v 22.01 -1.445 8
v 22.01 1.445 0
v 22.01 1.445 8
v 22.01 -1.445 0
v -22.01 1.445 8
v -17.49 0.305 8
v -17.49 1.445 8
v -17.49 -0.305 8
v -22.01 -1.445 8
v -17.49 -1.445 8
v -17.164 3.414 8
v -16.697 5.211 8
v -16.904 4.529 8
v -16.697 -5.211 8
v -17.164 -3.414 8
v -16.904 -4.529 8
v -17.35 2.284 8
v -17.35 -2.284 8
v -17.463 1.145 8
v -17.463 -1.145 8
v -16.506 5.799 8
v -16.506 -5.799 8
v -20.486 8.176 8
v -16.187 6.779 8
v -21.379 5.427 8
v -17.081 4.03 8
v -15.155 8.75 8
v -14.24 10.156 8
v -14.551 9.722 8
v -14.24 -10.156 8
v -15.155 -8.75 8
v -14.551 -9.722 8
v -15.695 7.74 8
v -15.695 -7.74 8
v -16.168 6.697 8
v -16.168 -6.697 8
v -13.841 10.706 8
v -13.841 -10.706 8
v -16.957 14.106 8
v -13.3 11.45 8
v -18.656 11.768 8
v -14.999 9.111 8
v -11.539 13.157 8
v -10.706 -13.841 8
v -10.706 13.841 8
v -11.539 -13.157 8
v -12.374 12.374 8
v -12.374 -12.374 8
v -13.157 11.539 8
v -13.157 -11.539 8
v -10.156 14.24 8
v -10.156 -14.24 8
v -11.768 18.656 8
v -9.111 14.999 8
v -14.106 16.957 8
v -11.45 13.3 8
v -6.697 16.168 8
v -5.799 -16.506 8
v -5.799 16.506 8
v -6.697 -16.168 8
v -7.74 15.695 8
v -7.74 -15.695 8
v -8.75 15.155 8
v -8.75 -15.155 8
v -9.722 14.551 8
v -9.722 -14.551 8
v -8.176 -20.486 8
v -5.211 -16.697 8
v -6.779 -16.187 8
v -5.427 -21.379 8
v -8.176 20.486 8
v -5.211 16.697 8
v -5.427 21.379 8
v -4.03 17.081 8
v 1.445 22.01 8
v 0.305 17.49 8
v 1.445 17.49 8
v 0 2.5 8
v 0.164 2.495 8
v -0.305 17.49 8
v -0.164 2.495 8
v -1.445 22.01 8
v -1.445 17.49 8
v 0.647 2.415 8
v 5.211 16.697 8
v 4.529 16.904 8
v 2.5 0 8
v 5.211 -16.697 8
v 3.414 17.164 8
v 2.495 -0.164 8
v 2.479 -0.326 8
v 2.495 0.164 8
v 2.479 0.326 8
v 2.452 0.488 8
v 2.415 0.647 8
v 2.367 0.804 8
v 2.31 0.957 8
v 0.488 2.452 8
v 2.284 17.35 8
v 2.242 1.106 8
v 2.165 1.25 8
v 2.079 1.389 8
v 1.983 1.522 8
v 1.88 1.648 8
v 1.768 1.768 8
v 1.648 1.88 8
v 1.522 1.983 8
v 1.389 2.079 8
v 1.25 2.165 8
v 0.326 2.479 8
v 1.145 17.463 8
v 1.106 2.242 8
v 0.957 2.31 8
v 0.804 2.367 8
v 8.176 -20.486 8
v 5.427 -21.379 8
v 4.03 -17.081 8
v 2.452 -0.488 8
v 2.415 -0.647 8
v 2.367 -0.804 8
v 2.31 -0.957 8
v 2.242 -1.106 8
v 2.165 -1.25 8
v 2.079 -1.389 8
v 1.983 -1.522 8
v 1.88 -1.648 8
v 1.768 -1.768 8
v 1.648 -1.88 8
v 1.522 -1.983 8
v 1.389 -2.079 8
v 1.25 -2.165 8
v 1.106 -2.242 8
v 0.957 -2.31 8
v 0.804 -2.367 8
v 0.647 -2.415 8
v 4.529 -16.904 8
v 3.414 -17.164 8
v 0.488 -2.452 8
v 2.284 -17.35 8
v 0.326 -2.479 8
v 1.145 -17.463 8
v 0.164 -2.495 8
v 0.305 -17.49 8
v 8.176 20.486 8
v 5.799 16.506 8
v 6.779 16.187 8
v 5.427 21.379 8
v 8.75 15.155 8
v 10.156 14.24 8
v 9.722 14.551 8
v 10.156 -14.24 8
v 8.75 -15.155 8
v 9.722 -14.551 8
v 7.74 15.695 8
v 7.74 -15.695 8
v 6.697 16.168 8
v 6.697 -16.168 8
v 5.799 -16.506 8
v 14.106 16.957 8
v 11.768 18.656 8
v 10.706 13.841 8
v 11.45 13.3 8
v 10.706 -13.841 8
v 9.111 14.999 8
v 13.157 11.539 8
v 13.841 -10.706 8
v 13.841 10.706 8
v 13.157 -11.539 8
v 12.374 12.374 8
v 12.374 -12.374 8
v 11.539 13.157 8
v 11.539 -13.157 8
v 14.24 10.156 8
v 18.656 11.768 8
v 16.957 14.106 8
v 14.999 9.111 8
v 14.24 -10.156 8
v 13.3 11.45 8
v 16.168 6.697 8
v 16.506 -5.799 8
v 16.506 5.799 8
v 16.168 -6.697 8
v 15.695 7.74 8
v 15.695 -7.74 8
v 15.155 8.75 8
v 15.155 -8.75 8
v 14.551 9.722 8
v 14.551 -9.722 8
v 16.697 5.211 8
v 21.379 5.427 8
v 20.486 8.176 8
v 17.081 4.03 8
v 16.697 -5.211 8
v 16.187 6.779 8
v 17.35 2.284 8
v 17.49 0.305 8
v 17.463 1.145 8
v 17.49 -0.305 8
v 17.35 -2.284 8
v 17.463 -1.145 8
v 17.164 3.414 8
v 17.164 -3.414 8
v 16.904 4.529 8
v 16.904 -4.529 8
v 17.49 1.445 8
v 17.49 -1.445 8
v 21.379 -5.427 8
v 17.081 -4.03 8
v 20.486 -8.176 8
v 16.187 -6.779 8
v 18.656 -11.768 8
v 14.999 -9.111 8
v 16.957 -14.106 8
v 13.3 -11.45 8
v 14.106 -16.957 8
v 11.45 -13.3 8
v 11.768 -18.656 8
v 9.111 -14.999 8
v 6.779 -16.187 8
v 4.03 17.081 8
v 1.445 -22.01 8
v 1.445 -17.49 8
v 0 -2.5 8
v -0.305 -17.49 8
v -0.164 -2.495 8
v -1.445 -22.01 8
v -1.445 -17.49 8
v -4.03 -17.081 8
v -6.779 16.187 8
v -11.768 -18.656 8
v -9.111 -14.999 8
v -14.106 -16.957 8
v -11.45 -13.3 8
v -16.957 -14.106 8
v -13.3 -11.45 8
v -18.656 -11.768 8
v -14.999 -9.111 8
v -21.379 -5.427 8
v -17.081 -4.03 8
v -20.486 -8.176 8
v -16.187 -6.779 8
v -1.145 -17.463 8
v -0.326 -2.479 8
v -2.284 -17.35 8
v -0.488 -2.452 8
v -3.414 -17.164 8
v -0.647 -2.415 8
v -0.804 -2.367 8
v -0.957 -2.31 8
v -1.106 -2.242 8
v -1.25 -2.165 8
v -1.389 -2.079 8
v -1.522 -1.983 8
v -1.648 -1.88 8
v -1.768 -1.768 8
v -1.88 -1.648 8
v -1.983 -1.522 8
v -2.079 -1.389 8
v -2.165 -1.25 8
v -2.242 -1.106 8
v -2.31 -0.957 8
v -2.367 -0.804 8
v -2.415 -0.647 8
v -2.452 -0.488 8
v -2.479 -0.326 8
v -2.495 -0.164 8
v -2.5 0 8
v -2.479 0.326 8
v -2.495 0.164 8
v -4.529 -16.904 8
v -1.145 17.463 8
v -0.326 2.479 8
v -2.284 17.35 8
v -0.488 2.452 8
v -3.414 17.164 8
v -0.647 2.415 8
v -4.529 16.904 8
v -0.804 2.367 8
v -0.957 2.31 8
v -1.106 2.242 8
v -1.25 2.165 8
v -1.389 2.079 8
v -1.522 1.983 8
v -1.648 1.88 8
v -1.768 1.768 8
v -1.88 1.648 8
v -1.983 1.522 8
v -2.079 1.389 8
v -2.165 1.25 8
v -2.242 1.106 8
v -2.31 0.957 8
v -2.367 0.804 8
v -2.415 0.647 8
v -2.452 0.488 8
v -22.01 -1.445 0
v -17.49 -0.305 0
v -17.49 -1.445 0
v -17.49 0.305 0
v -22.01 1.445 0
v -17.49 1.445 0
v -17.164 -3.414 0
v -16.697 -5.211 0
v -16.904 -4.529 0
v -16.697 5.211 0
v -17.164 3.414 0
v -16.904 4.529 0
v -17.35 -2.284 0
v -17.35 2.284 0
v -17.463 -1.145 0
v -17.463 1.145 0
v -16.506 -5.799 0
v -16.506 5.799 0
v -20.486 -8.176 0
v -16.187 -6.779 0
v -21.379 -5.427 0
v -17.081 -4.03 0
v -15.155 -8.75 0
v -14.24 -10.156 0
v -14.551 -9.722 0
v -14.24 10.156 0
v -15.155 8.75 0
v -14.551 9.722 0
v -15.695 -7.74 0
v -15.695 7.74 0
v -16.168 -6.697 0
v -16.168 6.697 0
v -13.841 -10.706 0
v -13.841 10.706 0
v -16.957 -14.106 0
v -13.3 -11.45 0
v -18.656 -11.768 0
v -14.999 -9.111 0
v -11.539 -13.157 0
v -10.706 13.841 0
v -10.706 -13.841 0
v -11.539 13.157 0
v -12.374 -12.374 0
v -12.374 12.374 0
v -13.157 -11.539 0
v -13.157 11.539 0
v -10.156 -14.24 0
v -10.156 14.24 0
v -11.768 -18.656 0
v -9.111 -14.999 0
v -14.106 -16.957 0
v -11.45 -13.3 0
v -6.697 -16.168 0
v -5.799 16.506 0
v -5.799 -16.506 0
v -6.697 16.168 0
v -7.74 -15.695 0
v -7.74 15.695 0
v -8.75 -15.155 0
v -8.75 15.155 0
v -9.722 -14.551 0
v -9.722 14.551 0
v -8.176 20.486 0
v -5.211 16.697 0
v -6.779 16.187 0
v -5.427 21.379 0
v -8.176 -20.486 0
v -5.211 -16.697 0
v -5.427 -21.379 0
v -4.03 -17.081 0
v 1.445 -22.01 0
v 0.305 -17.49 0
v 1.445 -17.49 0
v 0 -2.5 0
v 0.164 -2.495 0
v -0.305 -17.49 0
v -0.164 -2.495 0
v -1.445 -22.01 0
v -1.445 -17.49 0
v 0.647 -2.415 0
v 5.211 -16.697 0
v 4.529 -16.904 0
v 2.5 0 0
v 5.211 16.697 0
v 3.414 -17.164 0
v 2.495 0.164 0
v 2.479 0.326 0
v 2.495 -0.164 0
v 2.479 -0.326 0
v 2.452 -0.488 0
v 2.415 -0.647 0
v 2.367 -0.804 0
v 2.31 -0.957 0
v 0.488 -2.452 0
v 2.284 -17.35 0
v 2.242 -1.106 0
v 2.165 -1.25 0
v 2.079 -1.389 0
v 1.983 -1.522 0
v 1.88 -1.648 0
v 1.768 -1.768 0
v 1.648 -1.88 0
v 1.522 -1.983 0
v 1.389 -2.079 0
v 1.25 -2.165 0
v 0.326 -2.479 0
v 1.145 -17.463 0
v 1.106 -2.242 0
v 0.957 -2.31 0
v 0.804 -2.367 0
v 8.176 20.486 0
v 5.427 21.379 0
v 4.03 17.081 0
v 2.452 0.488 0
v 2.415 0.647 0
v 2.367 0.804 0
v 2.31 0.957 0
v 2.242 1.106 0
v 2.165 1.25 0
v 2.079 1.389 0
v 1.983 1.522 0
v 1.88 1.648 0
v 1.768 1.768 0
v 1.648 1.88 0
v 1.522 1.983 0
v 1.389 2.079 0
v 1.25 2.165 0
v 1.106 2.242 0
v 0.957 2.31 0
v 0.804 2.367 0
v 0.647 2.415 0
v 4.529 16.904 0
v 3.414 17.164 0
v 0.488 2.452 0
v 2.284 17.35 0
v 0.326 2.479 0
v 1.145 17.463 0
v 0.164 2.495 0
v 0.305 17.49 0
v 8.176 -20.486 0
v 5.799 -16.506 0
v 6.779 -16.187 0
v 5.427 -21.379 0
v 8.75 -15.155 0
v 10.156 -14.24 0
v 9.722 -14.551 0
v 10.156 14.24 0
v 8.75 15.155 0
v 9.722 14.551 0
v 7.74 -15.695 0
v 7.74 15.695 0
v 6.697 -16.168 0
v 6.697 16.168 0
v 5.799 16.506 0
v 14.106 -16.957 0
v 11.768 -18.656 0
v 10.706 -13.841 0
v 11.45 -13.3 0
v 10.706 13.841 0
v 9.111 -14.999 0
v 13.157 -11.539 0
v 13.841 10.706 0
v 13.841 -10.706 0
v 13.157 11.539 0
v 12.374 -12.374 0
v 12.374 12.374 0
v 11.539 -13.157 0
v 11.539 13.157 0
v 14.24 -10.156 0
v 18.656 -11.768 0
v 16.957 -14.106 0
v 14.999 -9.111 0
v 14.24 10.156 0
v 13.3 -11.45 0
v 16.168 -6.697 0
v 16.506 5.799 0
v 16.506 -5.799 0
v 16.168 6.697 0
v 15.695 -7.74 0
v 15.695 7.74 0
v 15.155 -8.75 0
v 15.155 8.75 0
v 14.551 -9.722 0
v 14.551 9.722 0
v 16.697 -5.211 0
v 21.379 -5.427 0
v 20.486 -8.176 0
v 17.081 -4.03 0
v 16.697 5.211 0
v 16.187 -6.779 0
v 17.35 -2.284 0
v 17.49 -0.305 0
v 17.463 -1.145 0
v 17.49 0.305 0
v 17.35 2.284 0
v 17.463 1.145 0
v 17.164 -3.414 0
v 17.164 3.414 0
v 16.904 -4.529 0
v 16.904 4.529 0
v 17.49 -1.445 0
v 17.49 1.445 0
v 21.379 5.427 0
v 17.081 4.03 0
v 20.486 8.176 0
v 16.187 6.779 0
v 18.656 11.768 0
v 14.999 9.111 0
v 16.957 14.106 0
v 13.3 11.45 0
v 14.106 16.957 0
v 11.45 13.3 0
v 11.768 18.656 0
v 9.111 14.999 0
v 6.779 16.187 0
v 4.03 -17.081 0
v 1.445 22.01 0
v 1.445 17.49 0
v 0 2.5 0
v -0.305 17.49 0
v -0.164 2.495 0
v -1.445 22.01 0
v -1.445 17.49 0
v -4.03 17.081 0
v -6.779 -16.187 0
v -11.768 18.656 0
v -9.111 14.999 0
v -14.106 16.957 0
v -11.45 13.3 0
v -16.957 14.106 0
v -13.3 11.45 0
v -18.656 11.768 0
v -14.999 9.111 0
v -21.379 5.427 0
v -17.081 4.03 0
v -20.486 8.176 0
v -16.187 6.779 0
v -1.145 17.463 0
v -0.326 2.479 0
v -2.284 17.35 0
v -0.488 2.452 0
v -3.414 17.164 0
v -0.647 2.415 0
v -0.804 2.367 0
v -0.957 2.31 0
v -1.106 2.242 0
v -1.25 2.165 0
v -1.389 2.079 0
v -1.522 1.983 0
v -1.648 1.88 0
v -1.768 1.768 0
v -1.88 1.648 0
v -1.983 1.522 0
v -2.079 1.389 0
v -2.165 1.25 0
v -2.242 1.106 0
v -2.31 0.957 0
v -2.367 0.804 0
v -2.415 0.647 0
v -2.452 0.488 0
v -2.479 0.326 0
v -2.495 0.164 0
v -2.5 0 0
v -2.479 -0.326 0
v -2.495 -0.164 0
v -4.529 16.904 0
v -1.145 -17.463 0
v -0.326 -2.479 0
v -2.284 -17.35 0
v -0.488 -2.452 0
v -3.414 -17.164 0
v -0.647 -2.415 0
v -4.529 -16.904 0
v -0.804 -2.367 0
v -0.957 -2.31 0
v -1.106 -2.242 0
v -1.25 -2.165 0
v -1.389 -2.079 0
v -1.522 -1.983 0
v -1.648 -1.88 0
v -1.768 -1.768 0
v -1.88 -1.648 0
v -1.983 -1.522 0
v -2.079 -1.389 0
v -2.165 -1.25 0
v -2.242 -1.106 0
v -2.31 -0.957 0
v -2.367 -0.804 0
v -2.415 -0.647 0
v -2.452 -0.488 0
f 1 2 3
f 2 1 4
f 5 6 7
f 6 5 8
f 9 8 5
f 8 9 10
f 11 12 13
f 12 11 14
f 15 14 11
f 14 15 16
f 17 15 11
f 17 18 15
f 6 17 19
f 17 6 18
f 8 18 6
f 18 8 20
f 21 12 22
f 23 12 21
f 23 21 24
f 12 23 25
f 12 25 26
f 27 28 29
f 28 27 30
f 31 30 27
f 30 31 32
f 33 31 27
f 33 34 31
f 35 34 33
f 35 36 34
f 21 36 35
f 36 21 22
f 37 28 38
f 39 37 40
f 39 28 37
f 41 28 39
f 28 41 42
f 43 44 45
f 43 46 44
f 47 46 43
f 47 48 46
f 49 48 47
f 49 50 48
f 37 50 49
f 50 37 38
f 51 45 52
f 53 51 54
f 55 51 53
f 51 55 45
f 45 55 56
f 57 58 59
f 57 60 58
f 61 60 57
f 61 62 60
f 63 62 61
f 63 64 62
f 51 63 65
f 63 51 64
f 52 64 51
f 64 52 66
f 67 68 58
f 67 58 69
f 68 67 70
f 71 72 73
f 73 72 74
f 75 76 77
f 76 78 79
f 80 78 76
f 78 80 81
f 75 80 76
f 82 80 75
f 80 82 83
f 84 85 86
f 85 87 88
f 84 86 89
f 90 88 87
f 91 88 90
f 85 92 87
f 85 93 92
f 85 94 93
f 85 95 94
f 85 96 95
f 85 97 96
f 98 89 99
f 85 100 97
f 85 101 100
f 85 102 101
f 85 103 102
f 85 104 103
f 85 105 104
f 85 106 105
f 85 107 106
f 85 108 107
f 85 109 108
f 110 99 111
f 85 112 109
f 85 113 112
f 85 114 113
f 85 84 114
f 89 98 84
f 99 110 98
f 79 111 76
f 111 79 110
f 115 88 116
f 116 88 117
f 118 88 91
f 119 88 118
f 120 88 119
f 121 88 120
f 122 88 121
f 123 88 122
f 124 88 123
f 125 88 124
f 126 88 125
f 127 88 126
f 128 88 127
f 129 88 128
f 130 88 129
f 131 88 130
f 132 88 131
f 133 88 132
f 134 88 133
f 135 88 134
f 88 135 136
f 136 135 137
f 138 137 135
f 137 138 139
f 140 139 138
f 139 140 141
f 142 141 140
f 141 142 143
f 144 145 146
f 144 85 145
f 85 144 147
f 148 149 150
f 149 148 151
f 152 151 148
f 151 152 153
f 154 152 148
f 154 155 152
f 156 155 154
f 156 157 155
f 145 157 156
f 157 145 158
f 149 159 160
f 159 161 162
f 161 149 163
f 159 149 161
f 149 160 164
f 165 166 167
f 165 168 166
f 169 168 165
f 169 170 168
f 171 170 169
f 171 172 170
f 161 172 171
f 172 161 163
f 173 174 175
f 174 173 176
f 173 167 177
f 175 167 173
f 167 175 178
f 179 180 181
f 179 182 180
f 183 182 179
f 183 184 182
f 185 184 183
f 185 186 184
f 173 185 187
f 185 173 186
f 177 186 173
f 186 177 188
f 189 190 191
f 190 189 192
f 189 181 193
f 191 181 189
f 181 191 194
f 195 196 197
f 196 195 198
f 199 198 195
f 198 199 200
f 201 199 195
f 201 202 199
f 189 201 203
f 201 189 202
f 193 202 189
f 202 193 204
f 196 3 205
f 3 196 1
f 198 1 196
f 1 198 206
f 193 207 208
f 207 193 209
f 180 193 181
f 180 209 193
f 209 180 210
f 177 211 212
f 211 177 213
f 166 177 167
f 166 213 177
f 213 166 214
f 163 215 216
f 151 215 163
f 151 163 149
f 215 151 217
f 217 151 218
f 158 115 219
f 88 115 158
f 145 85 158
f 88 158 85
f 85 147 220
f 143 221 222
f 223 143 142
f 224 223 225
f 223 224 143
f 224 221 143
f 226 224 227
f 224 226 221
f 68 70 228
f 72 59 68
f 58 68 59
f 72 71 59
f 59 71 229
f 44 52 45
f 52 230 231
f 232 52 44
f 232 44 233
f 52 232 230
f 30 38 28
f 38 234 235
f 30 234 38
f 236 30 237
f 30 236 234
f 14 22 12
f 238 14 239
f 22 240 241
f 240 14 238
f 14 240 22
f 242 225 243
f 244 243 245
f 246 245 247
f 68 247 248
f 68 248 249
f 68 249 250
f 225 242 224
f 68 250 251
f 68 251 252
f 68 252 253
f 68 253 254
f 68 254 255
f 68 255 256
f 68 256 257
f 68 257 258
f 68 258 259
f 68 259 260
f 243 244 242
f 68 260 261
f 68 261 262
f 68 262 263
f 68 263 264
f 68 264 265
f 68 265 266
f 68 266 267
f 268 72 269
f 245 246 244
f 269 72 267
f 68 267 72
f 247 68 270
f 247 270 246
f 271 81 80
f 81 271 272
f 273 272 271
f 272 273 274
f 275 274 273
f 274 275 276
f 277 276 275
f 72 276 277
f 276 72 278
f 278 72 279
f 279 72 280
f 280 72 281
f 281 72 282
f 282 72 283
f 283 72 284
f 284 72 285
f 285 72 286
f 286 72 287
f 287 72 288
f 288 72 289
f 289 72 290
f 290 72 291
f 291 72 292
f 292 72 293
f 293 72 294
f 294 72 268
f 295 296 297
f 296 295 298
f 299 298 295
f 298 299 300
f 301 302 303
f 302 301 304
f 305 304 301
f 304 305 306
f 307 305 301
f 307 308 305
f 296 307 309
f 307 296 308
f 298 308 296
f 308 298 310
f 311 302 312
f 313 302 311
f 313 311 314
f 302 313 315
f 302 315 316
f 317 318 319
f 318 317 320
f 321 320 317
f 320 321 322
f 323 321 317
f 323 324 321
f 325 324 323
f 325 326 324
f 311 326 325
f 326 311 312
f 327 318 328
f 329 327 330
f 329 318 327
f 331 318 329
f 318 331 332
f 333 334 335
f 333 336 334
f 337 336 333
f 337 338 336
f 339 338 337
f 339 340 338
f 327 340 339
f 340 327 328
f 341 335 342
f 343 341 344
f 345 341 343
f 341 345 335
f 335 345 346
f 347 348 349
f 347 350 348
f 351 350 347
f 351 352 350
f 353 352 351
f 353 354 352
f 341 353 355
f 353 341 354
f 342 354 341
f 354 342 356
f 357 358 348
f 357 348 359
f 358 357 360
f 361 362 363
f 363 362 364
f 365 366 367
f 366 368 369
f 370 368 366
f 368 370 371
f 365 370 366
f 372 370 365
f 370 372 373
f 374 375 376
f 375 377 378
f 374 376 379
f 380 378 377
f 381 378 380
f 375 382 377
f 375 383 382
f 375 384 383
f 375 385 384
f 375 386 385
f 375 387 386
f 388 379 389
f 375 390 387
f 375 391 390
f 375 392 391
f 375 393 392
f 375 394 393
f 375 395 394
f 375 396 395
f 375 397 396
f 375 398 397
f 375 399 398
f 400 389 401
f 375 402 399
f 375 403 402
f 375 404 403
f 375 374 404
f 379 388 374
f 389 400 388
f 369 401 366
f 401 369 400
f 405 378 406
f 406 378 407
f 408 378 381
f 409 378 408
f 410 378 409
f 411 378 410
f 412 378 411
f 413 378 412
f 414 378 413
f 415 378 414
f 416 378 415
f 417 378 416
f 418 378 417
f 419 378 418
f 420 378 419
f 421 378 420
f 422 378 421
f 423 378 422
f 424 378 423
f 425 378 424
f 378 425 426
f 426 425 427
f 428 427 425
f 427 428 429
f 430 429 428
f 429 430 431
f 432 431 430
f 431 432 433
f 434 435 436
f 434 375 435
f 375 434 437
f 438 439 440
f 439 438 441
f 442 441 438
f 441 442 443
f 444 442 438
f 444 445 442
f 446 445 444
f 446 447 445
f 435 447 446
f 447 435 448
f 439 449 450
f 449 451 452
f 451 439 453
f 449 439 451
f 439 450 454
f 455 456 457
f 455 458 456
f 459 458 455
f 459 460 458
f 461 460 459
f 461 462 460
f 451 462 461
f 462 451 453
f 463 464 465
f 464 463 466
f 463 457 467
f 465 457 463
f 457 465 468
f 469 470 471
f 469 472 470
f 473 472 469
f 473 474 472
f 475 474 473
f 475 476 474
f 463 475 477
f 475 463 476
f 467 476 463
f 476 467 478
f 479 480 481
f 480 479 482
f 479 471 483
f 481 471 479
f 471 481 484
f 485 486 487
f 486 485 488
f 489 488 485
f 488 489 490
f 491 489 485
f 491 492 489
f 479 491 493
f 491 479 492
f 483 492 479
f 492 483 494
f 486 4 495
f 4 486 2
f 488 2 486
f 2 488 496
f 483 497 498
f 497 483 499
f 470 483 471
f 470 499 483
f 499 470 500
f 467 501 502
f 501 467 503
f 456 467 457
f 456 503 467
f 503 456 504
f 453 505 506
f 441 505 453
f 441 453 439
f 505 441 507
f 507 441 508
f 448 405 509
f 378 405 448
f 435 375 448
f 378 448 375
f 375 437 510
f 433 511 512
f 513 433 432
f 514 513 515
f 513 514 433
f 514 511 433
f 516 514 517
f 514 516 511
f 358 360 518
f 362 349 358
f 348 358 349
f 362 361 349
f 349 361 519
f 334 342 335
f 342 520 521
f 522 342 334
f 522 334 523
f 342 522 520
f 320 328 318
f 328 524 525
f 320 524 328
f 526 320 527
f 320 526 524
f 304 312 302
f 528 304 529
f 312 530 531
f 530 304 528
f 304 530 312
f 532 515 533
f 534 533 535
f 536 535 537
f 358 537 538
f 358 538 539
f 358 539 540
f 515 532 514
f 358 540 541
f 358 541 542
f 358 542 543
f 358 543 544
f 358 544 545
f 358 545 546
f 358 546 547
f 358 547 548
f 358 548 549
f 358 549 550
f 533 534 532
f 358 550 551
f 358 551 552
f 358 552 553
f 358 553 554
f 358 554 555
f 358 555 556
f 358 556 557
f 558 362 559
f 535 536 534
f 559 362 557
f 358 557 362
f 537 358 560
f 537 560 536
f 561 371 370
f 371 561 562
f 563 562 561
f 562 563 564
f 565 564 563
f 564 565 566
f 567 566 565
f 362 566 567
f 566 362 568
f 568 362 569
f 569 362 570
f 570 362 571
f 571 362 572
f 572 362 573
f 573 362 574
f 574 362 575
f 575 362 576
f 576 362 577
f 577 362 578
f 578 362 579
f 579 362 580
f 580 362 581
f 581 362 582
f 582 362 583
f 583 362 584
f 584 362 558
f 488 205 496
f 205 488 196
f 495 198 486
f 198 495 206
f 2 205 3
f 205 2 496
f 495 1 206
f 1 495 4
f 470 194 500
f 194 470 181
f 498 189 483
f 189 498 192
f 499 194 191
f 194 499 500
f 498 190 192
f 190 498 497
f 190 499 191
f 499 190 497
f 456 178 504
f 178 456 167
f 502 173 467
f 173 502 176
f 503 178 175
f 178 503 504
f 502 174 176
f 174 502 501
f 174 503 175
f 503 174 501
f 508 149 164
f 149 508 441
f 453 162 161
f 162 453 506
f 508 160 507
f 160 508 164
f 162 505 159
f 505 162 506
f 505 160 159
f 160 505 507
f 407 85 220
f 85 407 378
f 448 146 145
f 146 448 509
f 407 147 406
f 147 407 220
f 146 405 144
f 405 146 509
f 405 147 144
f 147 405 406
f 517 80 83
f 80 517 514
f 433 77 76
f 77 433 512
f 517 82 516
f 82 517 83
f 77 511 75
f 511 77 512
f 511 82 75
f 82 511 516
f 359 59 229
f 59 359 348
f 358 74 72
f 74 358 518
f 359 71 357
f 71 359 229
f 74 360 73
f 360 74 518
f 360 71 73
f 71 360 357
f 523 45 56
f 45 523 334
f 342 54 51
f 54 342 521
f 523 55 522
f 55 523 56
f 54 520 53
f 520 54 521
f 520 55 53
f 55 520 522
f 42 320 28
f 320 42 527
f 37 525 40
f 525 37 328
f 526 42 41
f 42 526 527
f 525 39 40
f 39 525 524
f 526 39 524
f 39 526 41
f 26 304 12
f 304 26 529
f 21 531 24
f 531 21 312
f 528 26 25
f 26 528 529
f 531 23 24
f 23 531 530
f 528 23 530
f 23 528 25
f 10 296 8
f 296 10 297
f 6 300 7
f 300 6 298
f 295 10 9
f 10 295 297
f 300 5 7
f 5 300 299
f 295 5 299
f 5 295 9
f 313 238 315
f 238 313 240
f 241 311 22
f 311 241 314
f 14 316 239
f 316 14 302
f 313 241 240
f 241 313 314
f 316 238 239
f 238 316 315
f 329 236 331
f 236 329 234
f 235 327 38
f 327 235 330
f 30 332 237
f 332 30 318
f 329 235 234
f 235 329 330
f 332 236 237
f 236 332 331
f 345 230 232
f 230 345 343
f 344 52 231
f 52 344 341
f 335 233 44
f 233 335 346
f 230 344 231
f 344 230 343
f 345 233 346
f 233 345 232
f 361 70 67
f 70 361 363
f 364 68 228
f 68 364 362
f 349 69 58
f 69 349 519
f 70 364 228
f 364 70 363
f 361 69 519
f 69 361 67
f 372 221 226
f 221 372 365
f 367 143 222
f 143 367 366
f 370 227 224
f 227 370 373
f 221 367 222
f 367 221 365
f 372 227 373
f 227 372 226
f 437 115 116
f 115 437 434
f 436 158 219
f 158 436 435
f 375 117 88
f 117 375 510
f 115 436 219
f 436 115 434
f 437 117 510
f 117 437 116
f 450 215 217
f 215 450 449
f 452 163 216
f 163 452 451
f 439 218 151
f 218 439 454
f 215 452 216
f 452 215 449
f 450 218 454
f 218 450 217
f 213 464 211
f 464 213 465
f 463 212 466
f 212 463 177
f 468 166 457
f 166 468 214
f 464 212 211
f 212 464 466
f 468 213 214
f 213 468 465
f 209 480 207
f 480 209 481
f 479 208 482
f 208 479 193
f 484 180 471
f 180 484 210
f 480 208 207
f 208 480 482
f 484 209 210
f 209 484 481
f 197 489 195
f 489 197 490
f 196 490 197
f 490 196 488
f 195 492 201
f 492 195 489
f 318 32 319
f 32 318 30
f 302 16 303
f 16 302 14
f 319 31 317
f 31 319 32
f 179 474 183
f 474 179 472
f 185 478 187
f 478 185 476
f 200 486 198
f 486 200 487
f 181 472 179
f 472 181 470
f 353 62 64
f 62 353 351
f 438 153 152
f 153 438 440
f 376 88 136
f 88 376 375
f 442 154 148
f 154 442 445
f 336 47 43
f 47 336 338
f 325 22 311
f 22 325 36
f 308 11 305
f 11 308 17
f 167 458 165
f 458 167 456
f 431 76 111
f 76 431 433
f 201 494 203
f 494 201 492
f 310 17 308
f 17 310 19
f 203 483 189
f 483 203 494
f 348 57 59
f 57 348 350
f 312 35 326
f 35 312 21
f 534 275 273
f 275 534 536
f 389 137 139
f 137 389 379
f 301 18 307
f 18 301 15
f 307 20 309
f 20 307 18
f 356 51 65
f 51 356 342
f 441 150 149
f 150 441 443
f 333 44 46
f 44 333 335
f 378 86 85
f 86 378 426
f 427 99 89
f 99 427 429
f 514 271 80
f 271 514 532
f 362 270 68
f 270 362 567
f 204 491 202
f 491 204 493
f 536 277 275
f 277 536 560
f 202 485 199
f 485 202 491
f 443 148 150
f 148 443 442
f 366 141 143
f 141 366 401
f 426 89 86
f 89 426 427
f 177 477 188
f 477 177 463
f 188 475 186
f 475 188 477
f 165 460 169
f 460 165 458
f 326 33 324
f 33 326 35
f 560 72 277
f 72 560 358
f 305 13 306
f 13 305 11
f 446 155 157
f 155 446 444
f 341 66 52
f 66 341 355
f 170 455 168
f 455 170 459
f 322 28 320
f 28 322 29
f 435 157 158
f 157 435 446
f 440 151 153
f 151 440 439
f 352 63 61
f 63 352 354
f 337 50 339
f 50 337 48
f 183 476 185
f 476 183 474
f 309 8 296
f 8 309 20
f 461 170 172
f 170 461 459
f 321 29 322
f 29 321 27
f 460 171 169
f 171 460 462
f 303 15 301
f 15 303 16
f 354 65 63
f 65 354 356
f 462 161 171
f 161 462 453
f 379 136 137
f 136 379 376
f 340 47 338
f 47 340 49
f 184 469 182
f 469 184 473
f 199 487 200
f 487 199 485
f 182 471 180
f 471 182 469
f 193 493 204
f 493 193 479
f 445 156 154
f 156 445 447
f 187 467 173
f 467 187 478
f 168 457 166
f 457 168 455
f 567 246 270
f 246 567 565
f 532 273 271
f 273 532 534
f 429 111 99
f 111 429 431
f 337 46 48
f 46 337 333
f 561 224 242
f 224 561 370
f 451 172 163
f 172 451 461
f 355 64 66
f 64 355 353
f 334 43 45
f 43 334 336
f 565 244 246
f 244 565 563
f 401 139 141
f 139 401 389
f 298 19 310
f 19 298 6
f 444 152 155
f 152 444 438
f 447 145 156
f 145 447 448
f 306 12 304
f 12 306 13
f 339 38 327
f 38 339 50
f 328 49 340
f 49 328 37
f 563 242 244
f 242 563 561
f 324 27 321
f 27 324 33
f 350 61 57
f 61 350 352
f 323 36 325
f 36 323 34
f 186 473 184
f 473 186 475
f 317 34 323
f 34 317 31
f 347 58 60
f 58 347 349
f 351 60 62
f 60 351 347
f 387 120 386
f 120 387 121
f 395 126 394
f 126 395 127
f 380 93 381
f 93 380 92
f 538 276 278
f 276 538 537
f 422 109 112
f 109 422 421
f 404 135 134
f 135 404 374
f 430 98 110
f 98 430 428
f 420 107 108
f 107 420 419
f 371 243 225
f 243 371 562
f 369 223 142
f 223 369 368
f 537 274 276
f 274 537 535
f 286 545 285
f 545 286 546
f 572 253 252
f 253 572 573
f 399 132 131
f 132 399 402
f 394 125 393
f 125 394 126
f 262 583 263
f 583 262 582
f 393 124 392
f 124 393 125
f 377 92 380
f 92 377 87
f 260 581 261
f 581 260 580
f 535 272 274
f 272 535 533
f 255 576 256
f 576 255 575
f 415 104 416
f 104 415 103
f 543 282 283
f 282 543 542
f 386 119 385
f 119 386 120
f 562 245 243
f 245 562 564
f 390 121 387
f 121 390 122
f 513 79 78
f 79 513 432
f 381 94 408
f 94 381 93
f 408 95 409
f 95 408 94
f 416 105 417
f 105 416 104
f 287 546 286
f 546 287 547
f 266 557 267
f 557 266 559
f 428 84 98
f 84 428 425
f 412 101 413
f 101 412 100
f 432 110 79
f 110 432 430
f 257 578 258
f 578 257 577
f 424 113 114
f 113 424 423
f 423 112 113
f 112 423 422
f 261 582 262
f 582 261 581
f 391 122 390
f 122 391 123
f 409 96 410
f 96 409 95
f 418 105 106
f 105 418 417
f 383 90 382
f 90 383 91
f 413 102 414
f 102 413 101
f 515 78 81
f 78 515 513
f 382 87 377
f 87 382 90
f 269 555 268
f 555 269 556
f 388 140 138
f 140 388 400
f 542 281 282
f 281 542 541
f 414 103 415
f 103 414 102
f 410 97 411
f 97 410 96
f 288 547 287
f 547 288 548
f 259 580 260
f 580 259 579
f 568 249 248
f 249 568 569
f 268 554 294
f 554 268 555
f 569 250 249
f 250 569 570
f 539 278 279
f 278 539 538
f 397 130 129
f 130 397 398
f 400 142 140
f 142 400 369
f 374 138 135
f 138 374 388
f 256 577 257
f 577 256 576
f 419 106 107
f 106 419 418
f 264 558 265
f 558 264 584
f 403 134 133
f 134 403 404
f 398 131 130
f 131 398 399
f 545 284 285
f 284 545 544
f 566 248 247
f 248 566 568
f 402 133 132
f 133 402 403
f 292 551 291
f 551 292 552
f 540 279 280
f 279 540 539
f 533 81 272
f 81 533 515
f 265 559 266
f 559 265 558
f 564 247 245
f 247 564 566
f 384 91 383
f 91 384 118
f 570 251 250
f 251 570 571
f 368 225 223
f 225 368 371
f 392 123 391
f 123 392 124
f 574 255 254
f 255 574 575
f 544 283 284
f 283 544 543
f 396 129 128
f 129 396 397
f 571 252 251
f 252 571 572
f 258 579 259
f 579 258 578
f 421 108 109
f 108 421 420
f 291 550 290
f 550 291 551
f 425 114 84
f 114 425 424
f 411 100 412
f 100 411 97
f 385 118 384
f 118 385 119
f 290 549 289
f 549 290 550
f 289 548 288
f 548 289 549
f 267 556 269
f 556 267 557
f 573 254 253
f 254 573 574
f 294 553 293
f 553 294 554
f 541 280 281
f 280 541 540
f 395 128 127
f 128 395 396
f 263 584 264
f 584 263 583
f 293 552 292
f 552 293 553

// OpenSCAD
// @mps id=org.mechstudio.sample.spur-gear version=1.0.0 name="Spur Gear" description="Independent module exercising dimensional, count, angle, enum, ratio, and boolean parameters"

/* [Gear geometry] */
// @mps-param type=length label="Module" description="Tooth module in the selected dimensional input system"
tooth_module = 2; // [0.1:0.1:20]

// @mps-param type=integer label="Tooth count" description="Number of teeth"
tooth_count = 20; // [6:1:200]

// @mps-param type=length label="Thickness"
thickness = 8; // [0.1:0.1:100]

// @mps-param type=length label="Bore diameter"
bore_diameter = 5; // [0:0.1:200]

// @mps-param type=angle label="Pressure angle"
pressure_angle = 20; // [14.5:0.5:30]

/* [Options] */
// @mps-param type=enum label="Hub style"
hub_style = "none"; // [none:No hub, one:One side, both:Both sides]

// @mps-param type=length label="Hub diameter" visible_if="hub_style=one"
hub_diameter = 20; // [0:0.1:300]

// @mps-param type=boolean label="Lightening holes"
lightening_holes = false;

// @mps-param type=ratio label="Root clearance ratio"
clearance_ratio = 0.25; // [0:0.01:1]

/* [Hidden] */
$fn = 96;

pitch_diameter = tooth_module * tooth_count;
root_diameter = max(tooth_module * 2, pitch_diameter - 2.5 * tooth_module);
outside_diameter = pitch_diameter + 2 * tooth_module;
tooth_depth = (outside_diameter - root_diameter) / 2;
tooth_width = PI * tooth_module * 0.46;

assert(tooth_module > 0, "Module must be positive");
assert(tooth_count >= 6, "At least six teeth are required");
assert(thickness > 0, "Thickness must be positive");
assert(bore_diameter >= 0 && bore_diameter < root_diameter, "Bore must fit within the root diameter");

module gear_body() {
    union() {
        cylinder(d=root_diameter, h=thickness);
        for (index = [0:tooth_count-1])
            rotate([0, 0, index * 360 / tooth_count])
                translate([root_diameter / 2 - 0.01, -tooth_width / 2, 0])
                    cube([tooth_depth + 0.02, tooth_width, thickness]);
        if (hub_style == "one" || hub_style == "both")
            cylinder(d=hub_diameter, h=thickness + tooth_module);
        if (hub_style == "both")
            translate([0, 0, -tooth_module]) cylinder(d=hub_diameter, h=tooth_module);
    }
}

difference() {
    gear_body();
    translate([0, 0, -tooth_module - 0.01])
        cylinder(d=bore_diameter, h=thickness + 2 * tooth_module + 0.02);
    if (lightening_holes)
        for (index = [0:5])
            rotate([0, 0, index * 60])
                translate([pitch_diameter * 0.28, 0, -0.01])
                    cylinder(d=max(tooth_module, pitch_diameter * 0.12), h=thickness + 0.02);
}
